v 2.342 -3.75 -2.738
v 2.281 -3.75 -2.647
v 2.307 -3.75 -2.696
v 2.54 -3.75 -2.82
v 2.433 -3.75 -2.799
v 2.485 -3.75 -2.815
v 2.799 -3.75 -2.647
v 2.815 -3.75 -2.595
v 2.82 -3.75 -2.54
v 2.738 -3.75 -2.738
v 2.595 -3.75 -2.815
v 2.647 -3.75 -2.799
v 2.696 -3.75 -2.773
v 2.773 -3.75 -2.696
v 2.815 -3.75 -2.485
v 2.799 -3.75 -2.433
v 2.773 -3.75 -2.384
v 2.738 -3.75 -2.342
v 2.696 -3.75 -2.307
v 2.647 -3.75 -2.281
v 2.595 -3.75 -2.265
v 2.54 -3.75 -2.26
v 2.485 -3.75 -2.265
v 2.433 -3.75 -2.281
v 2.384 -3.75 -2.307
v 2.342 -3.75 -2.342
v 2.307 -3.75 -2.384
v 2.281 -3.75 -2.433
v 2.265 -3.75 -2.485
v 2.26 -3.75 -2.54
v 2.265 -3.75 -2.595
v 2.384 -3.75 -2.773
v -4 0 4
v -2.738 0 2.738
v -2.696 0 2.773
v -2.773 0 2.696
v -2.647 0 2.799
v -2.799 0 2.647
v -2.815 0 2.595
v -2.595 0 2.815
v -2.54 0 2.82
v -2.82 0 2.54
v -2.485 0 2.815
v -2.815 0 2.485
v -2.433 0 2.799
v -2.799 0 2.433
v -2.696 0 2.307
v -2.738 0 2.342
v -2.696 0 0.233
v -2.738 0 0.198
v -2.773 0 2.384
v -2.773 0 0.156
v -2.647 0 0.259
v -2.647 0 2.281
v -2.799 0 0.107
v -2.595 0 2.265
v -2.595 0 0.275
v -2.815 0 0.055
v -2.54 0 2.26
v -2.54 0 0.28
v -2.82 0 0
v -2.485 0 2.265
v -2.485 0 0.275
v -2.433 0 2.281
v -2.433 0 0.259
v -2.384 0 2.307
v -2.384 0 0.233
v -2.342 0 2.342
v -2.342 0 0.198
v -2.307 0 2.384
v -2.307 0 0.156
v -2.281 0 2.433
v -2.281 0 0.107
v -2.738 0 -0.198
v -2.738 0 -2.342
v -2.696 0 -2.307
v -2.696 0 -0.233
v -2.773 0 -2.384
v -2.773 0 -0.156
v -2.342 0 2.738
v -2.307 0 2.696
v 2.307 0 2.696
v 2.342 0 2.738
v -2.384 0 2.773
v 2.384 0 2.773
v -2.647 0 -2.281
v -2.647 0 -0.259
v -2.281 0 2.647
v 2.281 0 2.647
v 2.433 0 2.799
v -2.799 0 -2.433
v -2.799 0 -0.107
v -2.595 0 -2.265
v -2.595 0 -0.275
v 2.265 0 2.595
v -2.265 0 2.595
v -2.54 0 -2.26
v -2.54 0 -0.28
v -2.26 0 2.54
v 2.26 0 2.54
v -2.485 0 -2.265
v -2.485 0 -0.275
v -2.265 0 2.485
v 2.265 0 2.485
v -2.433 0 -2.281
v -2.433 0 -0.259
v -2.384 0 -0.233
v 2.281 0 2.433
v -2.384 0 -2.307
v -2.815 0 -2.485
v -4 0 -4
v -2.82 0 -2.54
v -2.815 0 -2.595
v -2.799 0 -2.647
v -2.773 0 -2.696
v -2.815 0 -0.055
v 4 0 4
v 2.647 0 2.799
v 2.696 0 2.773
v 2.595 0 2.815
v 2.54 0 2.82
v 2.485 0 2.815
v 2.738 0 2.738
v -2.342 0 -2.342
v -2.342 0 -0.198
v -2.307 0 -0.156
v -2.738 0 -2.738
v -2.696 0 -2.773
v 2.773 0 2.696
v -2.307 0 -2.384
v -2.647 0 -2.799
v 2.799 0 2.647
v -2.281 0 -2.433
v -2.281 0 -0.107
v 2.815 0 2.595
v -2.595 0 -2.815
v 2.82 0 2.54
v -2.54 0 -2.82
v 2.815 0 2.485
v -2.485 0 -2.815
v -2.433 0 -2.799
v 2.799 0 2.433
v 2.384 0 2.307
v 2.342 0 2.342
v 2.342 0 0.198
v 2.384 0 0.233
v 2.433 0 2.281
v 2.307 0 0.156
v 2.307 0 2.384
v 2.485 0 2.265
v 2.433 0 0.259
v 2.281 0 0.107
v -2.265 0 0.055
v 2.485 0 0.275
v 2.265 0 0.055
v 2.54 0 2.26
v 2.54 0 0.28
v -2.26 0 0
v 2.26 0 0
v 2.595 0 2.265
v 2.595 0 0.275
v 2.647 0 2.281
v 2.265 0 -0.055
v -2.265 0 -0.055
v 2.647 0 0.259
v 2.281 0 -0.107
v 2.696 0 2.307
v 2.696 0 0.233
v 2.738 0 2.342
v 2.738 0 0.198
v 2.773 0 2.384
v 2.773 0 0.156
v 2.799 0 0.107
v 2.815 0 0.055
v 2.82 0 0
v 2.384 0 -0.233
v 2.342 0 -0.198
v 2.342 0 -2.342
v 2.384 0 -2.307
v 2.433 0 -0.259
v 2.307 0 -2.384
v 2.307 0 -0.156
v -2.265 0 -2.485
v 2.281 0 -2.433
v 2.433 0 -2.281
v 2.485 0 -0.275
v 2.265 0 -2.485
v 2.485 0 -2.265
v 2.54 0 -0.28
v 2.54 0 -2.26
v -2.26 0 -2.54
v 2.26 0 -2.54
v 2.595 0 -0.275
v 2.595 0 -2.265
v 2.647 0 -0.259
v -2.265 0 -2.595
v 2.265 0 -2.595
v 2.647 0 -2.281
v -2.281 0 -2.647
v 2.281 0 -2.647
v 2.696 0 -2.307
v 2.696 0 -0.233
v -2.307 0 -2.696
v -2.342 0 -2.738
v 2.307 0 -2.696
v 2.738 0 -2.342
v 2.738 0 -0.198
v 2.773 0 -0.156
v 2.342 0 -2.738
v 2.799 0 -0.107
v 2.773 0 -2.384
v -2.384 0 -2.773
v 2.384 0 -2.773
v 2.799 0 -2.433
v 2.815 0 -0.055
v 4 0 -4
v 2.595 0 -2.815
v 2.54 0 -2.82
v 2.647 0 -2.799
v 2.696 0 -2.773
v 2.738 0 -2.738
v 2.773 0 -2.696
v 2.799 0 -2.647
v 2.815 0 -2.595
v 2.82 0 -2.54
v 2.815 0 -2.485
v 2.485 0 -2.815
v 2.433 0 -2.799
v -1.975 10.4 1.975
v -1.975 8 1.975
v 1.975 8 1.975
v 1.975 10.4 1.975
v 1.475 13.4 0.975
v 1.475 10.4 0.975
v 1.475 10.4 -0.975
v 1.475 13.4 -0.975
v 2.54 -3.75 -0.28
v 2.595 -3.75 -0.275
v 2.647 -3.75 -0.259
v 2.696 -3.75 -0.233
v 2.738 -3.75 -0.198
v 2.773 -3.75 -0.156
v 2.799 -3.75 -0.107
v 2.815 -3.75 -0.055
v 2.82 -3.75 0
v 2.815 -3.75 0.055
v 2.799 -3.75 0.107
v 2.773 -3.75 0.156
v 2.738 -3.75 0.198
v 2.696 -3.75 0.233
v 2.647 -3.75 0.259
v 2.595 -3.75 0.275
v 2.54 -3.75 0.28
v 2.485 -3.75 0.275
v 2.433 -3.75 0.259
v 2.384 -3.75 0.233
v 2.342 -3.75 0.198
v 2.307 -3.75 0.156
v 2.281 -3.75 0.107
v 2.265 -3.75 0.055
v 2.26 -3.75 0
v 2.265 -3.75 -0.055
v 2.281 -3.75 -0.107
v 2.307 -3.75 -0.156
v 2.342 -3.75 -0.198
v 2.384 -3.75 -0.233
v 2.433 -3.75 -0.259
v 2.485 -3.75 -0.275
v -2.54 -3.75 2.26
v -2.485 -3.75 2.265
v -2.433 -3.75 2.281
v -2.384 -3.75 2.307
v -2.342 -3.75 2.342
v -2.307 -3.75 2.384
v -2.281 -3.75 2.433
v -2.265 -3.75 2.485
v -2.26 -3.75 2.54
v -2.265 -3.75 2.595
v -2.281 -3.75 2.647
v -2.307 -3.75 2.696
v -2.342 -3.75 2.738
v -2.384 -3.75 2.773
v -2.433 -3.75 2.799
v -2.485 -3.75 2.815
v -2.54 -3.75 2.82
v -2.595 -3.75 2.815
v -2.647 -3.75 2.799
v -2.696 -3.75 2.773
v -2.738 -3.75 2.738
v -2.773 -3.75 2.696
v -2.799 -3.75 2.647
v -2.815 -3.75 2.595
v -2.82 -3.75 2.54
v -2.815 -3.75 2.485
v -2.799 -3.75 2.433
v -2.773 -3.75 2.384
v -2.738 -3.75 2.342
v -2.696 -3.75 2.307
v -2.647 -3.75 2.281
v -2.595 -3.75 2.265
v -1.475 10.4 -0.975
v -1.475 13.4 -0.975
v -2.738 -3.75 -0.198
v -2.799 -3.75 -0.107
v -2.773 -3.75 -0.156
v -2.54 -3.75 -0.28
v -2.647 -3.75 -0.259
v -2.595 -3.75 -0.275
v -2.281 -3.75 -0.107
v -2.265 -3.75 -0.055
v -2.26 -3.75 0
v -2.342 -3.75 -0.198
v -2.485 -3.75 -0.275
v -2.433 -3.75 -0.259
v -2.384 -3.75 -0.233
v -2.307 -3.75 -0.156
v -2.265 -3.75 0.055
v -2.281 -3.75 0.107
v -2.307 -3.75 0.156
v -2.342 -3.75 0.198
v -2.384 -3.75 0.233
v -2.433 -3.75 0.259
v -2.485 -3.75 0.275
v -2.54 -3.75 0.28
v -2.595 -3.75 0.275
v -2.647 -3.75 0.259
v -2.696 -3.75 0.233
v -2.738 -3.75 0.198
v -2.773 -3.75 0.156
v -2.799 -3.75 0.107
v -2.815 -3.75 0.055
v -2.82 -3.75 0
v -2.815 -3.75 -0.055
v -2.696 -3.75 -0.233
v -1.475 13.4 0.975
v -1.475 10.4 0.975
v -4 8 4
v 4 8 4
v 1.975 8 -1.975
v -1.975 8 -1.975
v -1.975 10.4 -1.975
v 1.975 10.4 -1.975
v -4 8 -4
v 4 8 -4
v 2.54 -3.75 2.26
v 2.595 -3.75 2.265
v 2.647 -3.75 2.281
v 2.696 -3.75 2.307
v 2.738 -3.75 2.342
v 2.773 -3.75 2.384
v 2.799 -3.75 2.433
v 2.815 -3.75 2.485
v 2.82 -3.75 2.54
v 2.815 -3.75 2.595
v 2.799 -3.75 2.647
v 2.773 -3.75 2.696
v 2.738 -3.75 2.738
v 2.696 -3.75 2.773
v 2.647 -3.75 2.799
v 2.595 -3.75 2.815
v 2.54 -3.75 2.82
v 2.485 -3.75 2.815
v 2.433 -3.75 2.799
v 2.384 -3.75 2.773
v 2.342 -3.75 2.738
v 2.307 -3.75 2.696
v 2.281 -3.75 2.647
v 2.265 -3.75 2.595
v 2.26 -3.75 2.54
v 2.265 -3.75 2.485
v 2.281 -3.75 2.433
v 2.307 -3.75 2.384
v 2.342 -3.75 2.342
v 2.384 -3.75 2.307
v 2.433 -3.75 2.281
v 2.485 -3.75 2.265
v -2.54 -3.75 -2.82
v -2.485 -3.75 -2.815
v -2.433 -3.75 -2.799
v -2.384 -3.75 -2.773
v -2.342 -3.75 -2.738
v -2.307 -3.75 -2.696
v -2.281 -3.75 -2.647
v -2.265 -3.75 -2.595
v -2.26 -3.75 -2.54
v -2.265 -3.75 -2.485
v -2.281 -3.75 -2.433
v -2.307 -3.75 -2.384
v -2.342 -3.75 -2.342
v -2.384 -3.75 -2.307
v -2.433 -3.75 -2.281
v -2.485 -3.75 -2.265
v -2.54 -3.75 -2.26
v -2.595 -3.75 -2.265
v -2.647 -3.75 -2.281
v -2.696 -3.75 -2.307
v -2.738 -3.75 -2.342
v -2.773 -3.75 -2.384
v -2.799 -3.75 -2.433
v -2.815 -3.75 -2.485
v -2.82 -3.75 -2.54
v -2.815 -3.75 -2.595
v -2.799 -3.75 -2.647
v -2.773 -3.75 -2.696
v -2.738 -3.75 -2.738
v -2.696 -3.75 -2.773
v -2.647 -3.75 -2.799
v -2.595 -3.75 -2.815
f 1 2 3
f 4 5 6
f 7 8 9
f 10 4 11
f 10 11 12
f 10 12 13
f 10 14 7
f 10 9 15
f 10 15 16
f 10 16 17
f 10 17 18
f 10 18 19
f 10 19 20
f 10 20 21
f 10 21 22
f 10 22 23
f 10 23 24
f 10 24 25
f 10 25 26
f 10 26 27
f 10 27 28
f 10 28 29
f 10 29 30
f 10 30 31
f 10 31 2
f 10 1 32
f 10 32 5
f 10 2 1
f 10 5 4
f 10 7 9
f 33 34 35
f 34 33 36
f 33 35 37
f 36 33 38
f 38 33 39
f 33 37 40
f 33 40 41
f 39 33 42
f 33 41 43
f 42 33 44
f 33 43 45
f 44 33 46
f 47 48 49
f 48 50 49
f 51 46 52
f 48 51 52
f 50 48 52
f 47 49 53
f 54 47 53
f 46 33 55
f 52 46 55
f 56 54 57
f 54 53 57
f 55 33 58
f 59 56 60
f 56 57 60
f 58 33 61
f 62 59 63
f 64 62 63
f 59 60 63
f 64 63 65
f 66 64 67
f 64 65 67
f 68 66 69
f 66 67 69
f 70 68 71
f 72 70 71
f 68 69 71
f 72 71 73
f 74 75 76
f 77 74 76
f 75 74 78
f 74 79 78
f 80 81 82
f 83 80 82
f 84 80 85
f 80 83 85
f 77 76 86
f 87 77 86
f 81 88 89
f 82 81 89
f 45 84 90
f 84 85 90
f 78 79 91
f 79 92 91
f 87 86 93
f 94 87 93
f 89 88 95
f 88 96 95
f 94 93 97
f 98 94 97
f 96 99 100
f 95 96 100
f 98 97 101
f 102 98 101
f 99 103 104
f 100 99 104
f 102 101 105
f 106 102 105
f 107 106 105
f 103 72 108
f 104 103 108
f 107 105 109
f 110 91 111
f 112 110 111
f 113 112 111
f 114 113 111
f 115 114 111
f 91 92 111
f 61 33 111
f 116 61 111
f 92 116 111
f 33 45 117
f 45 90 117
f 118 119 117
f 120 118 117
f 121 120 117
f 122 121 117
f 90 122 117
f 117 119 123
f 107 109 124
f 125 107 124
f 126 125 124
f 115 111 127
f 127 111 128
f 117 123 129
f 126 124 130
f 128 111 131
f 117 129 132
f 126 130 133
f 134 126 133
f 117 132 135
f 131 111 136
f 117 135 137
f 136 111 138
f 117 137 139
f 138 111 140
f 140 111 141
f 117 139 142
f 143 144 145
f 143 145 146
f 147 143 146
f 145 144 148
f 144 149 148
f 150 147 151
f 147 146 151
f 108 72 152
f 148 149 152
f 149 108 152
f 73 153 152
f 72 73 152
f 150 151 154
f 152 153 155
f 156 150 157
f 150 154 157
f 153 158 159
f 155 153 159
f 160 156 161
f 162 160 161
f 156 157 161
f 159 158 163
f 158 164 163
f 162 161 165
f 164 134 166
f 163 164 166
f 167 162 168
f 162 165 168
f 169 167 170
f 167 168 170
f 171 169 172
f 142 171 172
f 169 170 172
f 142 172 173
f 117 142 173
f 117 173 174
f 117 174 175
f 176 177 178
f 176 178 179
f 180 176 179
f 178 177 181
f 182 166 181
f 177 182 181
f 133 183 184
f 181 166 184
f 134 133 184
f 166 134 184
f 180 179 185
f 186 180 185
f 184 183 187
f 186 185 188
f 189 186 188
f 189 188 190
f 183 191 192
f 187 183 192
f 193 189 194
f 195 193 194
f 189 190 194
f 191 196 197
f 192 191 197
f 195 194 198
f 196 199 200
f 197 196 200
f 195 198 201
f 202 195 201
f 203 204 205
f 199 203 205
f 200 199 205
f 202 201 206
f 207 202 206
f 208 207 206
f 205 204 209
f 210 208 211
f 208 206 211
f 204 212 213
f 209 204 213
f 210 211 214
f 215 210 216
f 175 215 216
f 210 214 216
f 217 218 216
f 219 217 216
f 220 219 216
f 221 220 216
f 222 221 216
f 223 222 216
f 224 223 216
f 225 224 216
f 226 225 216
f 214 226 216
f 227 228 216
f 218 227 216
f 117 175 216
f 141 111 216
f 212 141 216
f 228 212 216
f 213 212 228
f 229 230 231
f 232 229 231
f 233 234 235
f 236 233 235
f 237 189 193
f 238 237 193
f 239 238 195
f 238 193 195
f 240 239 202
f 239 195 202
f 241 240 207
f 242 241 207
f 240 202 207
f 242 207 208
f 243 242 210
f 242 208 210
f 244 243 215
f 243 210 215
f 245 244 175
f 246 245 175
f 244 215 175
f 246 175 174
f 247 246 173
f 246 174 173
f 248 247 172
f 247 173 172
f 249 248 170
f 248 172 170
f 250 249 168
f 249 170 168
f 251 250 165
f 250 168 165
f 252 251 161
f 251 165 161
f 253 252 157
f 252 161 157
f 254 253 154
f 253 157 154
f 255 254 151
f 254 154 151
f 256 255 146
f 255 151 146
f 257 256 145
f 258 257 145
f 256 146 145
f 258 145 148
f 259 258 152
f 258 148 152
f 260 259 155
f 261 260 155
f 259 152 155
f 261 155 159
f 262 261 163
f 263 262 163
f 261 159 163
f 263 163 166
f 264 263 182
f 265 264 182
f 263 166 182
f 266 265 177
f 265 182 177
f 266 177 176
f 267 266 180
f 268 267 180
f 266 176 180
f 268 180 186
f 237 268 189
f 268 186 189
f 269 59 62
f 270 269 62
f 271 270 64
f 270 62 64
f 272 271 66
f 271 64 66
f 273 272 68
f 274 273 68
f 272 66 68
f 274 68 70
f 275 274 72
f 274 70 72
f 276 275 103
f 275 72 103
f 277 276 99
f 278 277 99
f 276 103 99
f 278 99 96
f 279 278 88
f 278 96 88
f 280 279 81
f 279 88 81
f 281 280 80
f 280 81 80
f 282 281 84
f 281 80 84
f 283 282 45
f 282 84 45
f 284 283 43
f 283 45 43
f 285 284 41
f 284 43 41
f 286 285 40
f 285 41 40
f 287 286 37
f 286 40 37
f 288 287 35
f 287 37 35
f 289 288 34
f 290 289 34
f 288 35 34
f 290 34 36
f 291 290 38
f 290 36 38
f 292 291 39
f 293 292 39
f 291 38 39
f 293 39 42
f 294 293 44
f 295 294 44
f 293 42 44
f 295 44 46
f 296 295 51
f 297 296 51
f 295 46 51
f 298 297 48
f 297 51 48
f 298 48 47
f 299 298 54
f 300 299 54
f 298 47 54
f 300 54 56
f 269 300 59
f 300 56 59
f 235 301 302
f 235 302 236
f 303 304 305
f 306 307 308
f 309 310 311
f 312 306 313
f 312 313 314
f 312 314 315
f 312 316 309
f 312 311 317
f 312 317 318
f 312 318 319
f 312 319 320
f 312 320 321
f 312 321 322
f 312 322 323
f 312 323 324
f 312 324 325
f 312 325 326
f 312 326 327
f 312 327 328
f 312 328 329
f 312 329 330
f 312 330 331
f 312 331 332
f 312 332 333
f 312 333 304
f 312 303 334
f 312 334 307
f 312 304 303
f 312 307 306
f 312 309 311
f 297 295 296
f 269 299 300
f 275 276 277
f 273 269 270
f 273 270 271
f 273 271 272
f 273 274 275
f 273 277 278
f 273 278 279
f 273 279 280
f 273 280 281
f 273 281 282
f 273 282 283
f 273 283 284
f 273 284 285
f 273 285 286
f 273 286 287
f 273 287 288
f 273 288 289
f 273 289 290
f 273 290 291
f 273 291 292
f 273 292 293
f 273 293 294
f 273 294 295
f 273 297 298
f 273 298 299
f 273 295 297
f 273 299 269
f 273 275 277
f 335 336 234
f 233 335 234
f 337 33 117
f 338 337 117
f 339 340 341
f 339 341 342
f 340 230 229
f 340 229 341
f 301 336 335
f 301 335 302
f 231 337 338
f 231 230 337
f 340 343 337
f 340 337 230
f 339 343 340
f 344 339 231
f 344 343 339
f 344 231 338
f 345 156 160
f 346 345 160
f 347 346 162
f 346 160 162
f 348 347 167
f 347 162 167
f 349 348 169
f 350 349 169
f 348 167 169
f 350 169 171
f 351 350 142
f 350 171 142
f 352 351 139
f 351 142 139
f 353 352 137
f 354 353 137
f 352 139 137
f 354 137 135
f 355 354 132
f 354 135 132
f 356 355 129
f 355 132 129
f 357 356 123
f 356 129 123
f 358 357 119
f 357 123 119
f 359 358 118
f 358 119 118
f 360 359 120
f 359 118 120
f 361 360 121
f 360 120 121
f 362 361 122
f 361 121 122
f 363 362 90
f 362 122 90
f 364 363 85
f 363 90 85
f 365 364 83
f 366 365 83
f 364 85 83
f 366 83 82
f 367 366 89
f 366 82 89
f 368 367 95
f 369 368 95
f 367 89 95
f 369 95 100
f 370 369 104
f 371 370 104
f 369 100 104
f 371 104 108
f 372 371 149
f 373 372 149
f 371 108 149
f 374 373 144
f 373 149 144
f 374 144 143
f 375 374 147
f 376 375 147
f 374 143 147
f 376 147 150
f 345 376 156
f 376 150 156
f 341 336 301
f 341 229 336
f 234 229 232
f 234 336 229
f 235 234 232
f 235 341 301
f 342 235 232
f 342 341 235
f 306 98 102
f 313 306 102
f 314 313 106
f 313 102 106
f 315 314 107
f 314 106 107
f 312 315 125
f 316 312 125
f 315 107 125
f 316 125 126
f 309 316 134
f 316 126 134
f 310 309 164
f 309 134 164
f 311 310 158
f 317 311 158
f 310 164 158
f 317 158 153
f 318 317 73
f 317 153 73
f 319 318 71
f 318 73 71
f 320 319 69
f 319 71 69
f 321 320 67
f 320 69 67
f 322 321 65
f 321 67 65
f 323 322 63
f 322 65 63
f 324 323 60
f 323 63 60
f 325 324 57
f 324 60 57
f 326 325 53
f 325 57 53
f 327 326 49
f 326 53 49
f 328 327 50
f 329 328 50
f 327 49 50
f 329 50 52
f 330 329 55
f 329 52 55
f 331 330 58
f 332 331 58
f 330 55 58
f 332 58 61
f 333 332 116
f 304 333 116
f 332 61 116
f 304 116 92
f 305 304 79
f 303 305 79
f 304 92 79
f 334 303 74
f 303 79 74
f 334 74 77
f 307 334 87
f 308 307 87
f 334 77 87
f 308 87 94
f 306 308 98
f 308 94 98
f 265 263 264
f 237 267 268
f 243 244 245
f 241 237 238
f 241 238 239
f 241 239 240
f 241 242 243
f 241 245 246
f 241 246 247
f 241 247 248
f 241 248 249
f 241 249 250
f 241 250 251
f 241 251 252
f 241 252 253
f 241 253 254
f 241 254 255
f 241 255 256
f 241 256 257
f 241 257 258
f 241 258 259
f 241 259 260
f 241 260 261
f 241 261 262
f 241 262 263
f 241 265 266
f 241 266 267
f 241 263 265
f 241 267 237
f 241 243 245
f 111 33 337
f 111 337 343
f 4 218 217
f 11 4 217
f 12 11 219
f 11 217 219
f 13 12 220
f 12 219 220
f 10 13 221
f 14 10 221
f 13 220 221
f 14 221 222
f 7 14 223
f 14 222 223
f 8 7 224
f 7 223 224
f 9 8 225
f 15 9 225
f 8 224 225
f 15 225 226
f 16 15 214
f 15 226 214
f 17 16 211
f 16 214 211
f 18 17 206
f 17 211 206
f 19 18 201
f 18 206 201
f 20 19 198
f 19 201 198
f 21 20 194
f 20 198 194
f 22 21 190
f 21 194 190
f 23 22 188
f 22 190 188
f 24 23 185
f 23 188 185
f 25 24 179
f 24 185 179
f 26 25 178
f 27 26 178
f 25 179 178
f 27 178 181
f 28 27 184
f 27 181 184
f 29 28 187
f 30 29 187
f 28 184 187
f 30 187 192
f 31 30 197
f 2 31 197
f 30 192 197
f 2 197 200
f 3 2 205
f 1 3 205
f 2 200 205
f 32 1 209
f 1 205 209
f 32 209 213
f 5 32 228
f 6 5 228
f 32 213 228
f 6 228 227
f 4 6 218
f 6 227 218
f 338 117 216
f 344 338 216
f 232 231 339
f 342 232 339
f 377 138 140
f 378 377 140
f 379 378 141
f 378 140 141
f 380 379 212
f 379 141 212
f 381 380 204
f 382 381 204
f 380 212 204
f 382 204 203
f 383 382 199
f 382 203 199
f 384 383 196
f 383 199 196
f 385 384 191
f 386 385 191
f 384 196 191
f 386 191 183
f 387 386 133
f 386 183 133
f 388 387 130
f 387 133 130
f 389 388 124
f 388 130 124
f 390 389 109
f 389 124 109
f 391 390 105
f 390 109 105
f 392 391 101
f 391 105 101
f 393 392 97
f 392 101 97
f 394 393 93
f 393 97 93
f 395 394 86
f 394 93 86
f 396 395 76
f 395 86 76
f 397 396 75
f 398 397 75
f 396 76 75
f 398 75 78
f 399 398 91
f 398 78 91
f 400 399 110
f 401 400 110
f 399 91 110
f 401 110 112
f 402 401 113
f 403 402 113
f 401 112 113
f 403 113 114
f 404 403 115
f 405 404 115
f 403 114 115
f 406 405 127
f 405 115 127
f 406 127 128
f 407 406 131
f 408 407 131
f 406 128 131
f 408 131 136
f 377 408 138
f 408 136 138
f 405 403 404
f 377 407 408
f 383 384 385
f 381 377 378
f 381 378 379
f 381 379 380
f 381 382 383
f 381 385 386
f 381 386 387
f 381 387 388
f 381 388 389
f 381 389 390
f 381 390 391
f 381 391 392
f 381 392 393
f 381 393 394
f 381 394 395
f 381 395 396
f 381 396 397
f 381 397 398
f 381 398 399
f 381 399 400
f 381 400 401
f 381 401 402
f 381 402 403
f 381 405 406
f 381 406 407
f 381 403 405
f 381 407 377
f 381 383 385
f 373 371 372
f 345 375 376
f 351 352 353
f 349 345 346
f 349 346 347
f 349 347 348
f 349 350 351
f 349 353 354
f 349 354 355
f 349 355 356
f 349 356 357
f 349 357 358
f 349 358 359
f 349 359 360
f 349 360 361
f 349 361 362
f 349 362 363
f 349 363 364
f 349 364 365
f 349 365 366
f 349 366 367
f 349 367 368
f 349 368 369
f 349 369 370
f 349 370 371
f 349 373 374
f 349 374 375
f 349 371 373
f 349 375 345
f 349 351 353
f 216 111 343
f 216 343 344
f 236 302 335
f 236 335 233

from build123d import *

# Parameters (mm, degrees)
SKETCH1_W           = 8
SKETCH1_H           = 8
BOSS_EXTRUDE1_DEPTH = 8
SKETCH2_W           = 3.95
SKETCH2_H           = 3.95
BOSS_EXTRUDE2_DEPTH = 2.4
SKETCH3_W           = 2.95
SKETCH3_H           = 1.95
BOSS_EXTRUDE3_DEPTH = 3
SKETCH4_R           = 0.28
BOSS_EXTRUDE4_DEPTH = 3.75


with BuildPart() as part:
    # Sketch1 → Boss-Extrude1 (new body)
    with BuildSketch(Plane(origin=(0, 0, 0), x_dir=(1, 0, 0), z_dir=(0, 1, 0))):
        Rectangle(SKETCH1_W, SKETCH1_H)
    extrude(amount=BOSS_EXTRUDE1_DEPTH)

    # Sketch2 → Boss-Extrude2 (add)
    with BuildSketch(Plane(origin=(0, 8, 0), x_dir=(1, 0, 0), z_dir=(0, 1, 0))):
        Rectangle(SKETCH2_W, SKETCH2_H)
    extrude(amount=BOSS_EXTRUDE2_DEPTH)

    # Sketch3 → Boss-Extrude3 (add)
    with BuildSketch(Plane(origin=(0, 10.4, 0), x_dir=(1, 0, 0), z_dir=(0, 1, 0))):
        Rectangle(SKETCH3_W, SKETCH3_H)
    extrude(amount=BOSS_EXTRUDE3_DEPTH)

    # Sketch4 → Boss-Extrude4 (add)
    with BuildSketch(Plane.XZ):
        with Locations(Location((2.54, 2.54, 0), (0, 0, 270))):
            Circle(SKETCH4_R)
        with Locations(Location((2.54, 0, 0), (0, 0, 270))):
            Circle(SKETCH4_R)
        with Locations(Location((2.54, -2.54, 0), (0, 0, 270))):
            Circle(SKETCH4_R)
        with Locations(Location((-2.54, -2.54, 0), (0, 0, 270))):
            Circle(SKETCH4_R)
        with Locations(Location((-2.54, 0, 0), (0, 0, 270))):
            Circle(SKETCH4_R)
        with Locations(Location((-2.54, 2.54, 0), (0, 0, 270))):
            Circle(SKETCH4_R)
    extrude(amount=BOSS_EXTRUDE4_DEPTH)


solid = part.part
